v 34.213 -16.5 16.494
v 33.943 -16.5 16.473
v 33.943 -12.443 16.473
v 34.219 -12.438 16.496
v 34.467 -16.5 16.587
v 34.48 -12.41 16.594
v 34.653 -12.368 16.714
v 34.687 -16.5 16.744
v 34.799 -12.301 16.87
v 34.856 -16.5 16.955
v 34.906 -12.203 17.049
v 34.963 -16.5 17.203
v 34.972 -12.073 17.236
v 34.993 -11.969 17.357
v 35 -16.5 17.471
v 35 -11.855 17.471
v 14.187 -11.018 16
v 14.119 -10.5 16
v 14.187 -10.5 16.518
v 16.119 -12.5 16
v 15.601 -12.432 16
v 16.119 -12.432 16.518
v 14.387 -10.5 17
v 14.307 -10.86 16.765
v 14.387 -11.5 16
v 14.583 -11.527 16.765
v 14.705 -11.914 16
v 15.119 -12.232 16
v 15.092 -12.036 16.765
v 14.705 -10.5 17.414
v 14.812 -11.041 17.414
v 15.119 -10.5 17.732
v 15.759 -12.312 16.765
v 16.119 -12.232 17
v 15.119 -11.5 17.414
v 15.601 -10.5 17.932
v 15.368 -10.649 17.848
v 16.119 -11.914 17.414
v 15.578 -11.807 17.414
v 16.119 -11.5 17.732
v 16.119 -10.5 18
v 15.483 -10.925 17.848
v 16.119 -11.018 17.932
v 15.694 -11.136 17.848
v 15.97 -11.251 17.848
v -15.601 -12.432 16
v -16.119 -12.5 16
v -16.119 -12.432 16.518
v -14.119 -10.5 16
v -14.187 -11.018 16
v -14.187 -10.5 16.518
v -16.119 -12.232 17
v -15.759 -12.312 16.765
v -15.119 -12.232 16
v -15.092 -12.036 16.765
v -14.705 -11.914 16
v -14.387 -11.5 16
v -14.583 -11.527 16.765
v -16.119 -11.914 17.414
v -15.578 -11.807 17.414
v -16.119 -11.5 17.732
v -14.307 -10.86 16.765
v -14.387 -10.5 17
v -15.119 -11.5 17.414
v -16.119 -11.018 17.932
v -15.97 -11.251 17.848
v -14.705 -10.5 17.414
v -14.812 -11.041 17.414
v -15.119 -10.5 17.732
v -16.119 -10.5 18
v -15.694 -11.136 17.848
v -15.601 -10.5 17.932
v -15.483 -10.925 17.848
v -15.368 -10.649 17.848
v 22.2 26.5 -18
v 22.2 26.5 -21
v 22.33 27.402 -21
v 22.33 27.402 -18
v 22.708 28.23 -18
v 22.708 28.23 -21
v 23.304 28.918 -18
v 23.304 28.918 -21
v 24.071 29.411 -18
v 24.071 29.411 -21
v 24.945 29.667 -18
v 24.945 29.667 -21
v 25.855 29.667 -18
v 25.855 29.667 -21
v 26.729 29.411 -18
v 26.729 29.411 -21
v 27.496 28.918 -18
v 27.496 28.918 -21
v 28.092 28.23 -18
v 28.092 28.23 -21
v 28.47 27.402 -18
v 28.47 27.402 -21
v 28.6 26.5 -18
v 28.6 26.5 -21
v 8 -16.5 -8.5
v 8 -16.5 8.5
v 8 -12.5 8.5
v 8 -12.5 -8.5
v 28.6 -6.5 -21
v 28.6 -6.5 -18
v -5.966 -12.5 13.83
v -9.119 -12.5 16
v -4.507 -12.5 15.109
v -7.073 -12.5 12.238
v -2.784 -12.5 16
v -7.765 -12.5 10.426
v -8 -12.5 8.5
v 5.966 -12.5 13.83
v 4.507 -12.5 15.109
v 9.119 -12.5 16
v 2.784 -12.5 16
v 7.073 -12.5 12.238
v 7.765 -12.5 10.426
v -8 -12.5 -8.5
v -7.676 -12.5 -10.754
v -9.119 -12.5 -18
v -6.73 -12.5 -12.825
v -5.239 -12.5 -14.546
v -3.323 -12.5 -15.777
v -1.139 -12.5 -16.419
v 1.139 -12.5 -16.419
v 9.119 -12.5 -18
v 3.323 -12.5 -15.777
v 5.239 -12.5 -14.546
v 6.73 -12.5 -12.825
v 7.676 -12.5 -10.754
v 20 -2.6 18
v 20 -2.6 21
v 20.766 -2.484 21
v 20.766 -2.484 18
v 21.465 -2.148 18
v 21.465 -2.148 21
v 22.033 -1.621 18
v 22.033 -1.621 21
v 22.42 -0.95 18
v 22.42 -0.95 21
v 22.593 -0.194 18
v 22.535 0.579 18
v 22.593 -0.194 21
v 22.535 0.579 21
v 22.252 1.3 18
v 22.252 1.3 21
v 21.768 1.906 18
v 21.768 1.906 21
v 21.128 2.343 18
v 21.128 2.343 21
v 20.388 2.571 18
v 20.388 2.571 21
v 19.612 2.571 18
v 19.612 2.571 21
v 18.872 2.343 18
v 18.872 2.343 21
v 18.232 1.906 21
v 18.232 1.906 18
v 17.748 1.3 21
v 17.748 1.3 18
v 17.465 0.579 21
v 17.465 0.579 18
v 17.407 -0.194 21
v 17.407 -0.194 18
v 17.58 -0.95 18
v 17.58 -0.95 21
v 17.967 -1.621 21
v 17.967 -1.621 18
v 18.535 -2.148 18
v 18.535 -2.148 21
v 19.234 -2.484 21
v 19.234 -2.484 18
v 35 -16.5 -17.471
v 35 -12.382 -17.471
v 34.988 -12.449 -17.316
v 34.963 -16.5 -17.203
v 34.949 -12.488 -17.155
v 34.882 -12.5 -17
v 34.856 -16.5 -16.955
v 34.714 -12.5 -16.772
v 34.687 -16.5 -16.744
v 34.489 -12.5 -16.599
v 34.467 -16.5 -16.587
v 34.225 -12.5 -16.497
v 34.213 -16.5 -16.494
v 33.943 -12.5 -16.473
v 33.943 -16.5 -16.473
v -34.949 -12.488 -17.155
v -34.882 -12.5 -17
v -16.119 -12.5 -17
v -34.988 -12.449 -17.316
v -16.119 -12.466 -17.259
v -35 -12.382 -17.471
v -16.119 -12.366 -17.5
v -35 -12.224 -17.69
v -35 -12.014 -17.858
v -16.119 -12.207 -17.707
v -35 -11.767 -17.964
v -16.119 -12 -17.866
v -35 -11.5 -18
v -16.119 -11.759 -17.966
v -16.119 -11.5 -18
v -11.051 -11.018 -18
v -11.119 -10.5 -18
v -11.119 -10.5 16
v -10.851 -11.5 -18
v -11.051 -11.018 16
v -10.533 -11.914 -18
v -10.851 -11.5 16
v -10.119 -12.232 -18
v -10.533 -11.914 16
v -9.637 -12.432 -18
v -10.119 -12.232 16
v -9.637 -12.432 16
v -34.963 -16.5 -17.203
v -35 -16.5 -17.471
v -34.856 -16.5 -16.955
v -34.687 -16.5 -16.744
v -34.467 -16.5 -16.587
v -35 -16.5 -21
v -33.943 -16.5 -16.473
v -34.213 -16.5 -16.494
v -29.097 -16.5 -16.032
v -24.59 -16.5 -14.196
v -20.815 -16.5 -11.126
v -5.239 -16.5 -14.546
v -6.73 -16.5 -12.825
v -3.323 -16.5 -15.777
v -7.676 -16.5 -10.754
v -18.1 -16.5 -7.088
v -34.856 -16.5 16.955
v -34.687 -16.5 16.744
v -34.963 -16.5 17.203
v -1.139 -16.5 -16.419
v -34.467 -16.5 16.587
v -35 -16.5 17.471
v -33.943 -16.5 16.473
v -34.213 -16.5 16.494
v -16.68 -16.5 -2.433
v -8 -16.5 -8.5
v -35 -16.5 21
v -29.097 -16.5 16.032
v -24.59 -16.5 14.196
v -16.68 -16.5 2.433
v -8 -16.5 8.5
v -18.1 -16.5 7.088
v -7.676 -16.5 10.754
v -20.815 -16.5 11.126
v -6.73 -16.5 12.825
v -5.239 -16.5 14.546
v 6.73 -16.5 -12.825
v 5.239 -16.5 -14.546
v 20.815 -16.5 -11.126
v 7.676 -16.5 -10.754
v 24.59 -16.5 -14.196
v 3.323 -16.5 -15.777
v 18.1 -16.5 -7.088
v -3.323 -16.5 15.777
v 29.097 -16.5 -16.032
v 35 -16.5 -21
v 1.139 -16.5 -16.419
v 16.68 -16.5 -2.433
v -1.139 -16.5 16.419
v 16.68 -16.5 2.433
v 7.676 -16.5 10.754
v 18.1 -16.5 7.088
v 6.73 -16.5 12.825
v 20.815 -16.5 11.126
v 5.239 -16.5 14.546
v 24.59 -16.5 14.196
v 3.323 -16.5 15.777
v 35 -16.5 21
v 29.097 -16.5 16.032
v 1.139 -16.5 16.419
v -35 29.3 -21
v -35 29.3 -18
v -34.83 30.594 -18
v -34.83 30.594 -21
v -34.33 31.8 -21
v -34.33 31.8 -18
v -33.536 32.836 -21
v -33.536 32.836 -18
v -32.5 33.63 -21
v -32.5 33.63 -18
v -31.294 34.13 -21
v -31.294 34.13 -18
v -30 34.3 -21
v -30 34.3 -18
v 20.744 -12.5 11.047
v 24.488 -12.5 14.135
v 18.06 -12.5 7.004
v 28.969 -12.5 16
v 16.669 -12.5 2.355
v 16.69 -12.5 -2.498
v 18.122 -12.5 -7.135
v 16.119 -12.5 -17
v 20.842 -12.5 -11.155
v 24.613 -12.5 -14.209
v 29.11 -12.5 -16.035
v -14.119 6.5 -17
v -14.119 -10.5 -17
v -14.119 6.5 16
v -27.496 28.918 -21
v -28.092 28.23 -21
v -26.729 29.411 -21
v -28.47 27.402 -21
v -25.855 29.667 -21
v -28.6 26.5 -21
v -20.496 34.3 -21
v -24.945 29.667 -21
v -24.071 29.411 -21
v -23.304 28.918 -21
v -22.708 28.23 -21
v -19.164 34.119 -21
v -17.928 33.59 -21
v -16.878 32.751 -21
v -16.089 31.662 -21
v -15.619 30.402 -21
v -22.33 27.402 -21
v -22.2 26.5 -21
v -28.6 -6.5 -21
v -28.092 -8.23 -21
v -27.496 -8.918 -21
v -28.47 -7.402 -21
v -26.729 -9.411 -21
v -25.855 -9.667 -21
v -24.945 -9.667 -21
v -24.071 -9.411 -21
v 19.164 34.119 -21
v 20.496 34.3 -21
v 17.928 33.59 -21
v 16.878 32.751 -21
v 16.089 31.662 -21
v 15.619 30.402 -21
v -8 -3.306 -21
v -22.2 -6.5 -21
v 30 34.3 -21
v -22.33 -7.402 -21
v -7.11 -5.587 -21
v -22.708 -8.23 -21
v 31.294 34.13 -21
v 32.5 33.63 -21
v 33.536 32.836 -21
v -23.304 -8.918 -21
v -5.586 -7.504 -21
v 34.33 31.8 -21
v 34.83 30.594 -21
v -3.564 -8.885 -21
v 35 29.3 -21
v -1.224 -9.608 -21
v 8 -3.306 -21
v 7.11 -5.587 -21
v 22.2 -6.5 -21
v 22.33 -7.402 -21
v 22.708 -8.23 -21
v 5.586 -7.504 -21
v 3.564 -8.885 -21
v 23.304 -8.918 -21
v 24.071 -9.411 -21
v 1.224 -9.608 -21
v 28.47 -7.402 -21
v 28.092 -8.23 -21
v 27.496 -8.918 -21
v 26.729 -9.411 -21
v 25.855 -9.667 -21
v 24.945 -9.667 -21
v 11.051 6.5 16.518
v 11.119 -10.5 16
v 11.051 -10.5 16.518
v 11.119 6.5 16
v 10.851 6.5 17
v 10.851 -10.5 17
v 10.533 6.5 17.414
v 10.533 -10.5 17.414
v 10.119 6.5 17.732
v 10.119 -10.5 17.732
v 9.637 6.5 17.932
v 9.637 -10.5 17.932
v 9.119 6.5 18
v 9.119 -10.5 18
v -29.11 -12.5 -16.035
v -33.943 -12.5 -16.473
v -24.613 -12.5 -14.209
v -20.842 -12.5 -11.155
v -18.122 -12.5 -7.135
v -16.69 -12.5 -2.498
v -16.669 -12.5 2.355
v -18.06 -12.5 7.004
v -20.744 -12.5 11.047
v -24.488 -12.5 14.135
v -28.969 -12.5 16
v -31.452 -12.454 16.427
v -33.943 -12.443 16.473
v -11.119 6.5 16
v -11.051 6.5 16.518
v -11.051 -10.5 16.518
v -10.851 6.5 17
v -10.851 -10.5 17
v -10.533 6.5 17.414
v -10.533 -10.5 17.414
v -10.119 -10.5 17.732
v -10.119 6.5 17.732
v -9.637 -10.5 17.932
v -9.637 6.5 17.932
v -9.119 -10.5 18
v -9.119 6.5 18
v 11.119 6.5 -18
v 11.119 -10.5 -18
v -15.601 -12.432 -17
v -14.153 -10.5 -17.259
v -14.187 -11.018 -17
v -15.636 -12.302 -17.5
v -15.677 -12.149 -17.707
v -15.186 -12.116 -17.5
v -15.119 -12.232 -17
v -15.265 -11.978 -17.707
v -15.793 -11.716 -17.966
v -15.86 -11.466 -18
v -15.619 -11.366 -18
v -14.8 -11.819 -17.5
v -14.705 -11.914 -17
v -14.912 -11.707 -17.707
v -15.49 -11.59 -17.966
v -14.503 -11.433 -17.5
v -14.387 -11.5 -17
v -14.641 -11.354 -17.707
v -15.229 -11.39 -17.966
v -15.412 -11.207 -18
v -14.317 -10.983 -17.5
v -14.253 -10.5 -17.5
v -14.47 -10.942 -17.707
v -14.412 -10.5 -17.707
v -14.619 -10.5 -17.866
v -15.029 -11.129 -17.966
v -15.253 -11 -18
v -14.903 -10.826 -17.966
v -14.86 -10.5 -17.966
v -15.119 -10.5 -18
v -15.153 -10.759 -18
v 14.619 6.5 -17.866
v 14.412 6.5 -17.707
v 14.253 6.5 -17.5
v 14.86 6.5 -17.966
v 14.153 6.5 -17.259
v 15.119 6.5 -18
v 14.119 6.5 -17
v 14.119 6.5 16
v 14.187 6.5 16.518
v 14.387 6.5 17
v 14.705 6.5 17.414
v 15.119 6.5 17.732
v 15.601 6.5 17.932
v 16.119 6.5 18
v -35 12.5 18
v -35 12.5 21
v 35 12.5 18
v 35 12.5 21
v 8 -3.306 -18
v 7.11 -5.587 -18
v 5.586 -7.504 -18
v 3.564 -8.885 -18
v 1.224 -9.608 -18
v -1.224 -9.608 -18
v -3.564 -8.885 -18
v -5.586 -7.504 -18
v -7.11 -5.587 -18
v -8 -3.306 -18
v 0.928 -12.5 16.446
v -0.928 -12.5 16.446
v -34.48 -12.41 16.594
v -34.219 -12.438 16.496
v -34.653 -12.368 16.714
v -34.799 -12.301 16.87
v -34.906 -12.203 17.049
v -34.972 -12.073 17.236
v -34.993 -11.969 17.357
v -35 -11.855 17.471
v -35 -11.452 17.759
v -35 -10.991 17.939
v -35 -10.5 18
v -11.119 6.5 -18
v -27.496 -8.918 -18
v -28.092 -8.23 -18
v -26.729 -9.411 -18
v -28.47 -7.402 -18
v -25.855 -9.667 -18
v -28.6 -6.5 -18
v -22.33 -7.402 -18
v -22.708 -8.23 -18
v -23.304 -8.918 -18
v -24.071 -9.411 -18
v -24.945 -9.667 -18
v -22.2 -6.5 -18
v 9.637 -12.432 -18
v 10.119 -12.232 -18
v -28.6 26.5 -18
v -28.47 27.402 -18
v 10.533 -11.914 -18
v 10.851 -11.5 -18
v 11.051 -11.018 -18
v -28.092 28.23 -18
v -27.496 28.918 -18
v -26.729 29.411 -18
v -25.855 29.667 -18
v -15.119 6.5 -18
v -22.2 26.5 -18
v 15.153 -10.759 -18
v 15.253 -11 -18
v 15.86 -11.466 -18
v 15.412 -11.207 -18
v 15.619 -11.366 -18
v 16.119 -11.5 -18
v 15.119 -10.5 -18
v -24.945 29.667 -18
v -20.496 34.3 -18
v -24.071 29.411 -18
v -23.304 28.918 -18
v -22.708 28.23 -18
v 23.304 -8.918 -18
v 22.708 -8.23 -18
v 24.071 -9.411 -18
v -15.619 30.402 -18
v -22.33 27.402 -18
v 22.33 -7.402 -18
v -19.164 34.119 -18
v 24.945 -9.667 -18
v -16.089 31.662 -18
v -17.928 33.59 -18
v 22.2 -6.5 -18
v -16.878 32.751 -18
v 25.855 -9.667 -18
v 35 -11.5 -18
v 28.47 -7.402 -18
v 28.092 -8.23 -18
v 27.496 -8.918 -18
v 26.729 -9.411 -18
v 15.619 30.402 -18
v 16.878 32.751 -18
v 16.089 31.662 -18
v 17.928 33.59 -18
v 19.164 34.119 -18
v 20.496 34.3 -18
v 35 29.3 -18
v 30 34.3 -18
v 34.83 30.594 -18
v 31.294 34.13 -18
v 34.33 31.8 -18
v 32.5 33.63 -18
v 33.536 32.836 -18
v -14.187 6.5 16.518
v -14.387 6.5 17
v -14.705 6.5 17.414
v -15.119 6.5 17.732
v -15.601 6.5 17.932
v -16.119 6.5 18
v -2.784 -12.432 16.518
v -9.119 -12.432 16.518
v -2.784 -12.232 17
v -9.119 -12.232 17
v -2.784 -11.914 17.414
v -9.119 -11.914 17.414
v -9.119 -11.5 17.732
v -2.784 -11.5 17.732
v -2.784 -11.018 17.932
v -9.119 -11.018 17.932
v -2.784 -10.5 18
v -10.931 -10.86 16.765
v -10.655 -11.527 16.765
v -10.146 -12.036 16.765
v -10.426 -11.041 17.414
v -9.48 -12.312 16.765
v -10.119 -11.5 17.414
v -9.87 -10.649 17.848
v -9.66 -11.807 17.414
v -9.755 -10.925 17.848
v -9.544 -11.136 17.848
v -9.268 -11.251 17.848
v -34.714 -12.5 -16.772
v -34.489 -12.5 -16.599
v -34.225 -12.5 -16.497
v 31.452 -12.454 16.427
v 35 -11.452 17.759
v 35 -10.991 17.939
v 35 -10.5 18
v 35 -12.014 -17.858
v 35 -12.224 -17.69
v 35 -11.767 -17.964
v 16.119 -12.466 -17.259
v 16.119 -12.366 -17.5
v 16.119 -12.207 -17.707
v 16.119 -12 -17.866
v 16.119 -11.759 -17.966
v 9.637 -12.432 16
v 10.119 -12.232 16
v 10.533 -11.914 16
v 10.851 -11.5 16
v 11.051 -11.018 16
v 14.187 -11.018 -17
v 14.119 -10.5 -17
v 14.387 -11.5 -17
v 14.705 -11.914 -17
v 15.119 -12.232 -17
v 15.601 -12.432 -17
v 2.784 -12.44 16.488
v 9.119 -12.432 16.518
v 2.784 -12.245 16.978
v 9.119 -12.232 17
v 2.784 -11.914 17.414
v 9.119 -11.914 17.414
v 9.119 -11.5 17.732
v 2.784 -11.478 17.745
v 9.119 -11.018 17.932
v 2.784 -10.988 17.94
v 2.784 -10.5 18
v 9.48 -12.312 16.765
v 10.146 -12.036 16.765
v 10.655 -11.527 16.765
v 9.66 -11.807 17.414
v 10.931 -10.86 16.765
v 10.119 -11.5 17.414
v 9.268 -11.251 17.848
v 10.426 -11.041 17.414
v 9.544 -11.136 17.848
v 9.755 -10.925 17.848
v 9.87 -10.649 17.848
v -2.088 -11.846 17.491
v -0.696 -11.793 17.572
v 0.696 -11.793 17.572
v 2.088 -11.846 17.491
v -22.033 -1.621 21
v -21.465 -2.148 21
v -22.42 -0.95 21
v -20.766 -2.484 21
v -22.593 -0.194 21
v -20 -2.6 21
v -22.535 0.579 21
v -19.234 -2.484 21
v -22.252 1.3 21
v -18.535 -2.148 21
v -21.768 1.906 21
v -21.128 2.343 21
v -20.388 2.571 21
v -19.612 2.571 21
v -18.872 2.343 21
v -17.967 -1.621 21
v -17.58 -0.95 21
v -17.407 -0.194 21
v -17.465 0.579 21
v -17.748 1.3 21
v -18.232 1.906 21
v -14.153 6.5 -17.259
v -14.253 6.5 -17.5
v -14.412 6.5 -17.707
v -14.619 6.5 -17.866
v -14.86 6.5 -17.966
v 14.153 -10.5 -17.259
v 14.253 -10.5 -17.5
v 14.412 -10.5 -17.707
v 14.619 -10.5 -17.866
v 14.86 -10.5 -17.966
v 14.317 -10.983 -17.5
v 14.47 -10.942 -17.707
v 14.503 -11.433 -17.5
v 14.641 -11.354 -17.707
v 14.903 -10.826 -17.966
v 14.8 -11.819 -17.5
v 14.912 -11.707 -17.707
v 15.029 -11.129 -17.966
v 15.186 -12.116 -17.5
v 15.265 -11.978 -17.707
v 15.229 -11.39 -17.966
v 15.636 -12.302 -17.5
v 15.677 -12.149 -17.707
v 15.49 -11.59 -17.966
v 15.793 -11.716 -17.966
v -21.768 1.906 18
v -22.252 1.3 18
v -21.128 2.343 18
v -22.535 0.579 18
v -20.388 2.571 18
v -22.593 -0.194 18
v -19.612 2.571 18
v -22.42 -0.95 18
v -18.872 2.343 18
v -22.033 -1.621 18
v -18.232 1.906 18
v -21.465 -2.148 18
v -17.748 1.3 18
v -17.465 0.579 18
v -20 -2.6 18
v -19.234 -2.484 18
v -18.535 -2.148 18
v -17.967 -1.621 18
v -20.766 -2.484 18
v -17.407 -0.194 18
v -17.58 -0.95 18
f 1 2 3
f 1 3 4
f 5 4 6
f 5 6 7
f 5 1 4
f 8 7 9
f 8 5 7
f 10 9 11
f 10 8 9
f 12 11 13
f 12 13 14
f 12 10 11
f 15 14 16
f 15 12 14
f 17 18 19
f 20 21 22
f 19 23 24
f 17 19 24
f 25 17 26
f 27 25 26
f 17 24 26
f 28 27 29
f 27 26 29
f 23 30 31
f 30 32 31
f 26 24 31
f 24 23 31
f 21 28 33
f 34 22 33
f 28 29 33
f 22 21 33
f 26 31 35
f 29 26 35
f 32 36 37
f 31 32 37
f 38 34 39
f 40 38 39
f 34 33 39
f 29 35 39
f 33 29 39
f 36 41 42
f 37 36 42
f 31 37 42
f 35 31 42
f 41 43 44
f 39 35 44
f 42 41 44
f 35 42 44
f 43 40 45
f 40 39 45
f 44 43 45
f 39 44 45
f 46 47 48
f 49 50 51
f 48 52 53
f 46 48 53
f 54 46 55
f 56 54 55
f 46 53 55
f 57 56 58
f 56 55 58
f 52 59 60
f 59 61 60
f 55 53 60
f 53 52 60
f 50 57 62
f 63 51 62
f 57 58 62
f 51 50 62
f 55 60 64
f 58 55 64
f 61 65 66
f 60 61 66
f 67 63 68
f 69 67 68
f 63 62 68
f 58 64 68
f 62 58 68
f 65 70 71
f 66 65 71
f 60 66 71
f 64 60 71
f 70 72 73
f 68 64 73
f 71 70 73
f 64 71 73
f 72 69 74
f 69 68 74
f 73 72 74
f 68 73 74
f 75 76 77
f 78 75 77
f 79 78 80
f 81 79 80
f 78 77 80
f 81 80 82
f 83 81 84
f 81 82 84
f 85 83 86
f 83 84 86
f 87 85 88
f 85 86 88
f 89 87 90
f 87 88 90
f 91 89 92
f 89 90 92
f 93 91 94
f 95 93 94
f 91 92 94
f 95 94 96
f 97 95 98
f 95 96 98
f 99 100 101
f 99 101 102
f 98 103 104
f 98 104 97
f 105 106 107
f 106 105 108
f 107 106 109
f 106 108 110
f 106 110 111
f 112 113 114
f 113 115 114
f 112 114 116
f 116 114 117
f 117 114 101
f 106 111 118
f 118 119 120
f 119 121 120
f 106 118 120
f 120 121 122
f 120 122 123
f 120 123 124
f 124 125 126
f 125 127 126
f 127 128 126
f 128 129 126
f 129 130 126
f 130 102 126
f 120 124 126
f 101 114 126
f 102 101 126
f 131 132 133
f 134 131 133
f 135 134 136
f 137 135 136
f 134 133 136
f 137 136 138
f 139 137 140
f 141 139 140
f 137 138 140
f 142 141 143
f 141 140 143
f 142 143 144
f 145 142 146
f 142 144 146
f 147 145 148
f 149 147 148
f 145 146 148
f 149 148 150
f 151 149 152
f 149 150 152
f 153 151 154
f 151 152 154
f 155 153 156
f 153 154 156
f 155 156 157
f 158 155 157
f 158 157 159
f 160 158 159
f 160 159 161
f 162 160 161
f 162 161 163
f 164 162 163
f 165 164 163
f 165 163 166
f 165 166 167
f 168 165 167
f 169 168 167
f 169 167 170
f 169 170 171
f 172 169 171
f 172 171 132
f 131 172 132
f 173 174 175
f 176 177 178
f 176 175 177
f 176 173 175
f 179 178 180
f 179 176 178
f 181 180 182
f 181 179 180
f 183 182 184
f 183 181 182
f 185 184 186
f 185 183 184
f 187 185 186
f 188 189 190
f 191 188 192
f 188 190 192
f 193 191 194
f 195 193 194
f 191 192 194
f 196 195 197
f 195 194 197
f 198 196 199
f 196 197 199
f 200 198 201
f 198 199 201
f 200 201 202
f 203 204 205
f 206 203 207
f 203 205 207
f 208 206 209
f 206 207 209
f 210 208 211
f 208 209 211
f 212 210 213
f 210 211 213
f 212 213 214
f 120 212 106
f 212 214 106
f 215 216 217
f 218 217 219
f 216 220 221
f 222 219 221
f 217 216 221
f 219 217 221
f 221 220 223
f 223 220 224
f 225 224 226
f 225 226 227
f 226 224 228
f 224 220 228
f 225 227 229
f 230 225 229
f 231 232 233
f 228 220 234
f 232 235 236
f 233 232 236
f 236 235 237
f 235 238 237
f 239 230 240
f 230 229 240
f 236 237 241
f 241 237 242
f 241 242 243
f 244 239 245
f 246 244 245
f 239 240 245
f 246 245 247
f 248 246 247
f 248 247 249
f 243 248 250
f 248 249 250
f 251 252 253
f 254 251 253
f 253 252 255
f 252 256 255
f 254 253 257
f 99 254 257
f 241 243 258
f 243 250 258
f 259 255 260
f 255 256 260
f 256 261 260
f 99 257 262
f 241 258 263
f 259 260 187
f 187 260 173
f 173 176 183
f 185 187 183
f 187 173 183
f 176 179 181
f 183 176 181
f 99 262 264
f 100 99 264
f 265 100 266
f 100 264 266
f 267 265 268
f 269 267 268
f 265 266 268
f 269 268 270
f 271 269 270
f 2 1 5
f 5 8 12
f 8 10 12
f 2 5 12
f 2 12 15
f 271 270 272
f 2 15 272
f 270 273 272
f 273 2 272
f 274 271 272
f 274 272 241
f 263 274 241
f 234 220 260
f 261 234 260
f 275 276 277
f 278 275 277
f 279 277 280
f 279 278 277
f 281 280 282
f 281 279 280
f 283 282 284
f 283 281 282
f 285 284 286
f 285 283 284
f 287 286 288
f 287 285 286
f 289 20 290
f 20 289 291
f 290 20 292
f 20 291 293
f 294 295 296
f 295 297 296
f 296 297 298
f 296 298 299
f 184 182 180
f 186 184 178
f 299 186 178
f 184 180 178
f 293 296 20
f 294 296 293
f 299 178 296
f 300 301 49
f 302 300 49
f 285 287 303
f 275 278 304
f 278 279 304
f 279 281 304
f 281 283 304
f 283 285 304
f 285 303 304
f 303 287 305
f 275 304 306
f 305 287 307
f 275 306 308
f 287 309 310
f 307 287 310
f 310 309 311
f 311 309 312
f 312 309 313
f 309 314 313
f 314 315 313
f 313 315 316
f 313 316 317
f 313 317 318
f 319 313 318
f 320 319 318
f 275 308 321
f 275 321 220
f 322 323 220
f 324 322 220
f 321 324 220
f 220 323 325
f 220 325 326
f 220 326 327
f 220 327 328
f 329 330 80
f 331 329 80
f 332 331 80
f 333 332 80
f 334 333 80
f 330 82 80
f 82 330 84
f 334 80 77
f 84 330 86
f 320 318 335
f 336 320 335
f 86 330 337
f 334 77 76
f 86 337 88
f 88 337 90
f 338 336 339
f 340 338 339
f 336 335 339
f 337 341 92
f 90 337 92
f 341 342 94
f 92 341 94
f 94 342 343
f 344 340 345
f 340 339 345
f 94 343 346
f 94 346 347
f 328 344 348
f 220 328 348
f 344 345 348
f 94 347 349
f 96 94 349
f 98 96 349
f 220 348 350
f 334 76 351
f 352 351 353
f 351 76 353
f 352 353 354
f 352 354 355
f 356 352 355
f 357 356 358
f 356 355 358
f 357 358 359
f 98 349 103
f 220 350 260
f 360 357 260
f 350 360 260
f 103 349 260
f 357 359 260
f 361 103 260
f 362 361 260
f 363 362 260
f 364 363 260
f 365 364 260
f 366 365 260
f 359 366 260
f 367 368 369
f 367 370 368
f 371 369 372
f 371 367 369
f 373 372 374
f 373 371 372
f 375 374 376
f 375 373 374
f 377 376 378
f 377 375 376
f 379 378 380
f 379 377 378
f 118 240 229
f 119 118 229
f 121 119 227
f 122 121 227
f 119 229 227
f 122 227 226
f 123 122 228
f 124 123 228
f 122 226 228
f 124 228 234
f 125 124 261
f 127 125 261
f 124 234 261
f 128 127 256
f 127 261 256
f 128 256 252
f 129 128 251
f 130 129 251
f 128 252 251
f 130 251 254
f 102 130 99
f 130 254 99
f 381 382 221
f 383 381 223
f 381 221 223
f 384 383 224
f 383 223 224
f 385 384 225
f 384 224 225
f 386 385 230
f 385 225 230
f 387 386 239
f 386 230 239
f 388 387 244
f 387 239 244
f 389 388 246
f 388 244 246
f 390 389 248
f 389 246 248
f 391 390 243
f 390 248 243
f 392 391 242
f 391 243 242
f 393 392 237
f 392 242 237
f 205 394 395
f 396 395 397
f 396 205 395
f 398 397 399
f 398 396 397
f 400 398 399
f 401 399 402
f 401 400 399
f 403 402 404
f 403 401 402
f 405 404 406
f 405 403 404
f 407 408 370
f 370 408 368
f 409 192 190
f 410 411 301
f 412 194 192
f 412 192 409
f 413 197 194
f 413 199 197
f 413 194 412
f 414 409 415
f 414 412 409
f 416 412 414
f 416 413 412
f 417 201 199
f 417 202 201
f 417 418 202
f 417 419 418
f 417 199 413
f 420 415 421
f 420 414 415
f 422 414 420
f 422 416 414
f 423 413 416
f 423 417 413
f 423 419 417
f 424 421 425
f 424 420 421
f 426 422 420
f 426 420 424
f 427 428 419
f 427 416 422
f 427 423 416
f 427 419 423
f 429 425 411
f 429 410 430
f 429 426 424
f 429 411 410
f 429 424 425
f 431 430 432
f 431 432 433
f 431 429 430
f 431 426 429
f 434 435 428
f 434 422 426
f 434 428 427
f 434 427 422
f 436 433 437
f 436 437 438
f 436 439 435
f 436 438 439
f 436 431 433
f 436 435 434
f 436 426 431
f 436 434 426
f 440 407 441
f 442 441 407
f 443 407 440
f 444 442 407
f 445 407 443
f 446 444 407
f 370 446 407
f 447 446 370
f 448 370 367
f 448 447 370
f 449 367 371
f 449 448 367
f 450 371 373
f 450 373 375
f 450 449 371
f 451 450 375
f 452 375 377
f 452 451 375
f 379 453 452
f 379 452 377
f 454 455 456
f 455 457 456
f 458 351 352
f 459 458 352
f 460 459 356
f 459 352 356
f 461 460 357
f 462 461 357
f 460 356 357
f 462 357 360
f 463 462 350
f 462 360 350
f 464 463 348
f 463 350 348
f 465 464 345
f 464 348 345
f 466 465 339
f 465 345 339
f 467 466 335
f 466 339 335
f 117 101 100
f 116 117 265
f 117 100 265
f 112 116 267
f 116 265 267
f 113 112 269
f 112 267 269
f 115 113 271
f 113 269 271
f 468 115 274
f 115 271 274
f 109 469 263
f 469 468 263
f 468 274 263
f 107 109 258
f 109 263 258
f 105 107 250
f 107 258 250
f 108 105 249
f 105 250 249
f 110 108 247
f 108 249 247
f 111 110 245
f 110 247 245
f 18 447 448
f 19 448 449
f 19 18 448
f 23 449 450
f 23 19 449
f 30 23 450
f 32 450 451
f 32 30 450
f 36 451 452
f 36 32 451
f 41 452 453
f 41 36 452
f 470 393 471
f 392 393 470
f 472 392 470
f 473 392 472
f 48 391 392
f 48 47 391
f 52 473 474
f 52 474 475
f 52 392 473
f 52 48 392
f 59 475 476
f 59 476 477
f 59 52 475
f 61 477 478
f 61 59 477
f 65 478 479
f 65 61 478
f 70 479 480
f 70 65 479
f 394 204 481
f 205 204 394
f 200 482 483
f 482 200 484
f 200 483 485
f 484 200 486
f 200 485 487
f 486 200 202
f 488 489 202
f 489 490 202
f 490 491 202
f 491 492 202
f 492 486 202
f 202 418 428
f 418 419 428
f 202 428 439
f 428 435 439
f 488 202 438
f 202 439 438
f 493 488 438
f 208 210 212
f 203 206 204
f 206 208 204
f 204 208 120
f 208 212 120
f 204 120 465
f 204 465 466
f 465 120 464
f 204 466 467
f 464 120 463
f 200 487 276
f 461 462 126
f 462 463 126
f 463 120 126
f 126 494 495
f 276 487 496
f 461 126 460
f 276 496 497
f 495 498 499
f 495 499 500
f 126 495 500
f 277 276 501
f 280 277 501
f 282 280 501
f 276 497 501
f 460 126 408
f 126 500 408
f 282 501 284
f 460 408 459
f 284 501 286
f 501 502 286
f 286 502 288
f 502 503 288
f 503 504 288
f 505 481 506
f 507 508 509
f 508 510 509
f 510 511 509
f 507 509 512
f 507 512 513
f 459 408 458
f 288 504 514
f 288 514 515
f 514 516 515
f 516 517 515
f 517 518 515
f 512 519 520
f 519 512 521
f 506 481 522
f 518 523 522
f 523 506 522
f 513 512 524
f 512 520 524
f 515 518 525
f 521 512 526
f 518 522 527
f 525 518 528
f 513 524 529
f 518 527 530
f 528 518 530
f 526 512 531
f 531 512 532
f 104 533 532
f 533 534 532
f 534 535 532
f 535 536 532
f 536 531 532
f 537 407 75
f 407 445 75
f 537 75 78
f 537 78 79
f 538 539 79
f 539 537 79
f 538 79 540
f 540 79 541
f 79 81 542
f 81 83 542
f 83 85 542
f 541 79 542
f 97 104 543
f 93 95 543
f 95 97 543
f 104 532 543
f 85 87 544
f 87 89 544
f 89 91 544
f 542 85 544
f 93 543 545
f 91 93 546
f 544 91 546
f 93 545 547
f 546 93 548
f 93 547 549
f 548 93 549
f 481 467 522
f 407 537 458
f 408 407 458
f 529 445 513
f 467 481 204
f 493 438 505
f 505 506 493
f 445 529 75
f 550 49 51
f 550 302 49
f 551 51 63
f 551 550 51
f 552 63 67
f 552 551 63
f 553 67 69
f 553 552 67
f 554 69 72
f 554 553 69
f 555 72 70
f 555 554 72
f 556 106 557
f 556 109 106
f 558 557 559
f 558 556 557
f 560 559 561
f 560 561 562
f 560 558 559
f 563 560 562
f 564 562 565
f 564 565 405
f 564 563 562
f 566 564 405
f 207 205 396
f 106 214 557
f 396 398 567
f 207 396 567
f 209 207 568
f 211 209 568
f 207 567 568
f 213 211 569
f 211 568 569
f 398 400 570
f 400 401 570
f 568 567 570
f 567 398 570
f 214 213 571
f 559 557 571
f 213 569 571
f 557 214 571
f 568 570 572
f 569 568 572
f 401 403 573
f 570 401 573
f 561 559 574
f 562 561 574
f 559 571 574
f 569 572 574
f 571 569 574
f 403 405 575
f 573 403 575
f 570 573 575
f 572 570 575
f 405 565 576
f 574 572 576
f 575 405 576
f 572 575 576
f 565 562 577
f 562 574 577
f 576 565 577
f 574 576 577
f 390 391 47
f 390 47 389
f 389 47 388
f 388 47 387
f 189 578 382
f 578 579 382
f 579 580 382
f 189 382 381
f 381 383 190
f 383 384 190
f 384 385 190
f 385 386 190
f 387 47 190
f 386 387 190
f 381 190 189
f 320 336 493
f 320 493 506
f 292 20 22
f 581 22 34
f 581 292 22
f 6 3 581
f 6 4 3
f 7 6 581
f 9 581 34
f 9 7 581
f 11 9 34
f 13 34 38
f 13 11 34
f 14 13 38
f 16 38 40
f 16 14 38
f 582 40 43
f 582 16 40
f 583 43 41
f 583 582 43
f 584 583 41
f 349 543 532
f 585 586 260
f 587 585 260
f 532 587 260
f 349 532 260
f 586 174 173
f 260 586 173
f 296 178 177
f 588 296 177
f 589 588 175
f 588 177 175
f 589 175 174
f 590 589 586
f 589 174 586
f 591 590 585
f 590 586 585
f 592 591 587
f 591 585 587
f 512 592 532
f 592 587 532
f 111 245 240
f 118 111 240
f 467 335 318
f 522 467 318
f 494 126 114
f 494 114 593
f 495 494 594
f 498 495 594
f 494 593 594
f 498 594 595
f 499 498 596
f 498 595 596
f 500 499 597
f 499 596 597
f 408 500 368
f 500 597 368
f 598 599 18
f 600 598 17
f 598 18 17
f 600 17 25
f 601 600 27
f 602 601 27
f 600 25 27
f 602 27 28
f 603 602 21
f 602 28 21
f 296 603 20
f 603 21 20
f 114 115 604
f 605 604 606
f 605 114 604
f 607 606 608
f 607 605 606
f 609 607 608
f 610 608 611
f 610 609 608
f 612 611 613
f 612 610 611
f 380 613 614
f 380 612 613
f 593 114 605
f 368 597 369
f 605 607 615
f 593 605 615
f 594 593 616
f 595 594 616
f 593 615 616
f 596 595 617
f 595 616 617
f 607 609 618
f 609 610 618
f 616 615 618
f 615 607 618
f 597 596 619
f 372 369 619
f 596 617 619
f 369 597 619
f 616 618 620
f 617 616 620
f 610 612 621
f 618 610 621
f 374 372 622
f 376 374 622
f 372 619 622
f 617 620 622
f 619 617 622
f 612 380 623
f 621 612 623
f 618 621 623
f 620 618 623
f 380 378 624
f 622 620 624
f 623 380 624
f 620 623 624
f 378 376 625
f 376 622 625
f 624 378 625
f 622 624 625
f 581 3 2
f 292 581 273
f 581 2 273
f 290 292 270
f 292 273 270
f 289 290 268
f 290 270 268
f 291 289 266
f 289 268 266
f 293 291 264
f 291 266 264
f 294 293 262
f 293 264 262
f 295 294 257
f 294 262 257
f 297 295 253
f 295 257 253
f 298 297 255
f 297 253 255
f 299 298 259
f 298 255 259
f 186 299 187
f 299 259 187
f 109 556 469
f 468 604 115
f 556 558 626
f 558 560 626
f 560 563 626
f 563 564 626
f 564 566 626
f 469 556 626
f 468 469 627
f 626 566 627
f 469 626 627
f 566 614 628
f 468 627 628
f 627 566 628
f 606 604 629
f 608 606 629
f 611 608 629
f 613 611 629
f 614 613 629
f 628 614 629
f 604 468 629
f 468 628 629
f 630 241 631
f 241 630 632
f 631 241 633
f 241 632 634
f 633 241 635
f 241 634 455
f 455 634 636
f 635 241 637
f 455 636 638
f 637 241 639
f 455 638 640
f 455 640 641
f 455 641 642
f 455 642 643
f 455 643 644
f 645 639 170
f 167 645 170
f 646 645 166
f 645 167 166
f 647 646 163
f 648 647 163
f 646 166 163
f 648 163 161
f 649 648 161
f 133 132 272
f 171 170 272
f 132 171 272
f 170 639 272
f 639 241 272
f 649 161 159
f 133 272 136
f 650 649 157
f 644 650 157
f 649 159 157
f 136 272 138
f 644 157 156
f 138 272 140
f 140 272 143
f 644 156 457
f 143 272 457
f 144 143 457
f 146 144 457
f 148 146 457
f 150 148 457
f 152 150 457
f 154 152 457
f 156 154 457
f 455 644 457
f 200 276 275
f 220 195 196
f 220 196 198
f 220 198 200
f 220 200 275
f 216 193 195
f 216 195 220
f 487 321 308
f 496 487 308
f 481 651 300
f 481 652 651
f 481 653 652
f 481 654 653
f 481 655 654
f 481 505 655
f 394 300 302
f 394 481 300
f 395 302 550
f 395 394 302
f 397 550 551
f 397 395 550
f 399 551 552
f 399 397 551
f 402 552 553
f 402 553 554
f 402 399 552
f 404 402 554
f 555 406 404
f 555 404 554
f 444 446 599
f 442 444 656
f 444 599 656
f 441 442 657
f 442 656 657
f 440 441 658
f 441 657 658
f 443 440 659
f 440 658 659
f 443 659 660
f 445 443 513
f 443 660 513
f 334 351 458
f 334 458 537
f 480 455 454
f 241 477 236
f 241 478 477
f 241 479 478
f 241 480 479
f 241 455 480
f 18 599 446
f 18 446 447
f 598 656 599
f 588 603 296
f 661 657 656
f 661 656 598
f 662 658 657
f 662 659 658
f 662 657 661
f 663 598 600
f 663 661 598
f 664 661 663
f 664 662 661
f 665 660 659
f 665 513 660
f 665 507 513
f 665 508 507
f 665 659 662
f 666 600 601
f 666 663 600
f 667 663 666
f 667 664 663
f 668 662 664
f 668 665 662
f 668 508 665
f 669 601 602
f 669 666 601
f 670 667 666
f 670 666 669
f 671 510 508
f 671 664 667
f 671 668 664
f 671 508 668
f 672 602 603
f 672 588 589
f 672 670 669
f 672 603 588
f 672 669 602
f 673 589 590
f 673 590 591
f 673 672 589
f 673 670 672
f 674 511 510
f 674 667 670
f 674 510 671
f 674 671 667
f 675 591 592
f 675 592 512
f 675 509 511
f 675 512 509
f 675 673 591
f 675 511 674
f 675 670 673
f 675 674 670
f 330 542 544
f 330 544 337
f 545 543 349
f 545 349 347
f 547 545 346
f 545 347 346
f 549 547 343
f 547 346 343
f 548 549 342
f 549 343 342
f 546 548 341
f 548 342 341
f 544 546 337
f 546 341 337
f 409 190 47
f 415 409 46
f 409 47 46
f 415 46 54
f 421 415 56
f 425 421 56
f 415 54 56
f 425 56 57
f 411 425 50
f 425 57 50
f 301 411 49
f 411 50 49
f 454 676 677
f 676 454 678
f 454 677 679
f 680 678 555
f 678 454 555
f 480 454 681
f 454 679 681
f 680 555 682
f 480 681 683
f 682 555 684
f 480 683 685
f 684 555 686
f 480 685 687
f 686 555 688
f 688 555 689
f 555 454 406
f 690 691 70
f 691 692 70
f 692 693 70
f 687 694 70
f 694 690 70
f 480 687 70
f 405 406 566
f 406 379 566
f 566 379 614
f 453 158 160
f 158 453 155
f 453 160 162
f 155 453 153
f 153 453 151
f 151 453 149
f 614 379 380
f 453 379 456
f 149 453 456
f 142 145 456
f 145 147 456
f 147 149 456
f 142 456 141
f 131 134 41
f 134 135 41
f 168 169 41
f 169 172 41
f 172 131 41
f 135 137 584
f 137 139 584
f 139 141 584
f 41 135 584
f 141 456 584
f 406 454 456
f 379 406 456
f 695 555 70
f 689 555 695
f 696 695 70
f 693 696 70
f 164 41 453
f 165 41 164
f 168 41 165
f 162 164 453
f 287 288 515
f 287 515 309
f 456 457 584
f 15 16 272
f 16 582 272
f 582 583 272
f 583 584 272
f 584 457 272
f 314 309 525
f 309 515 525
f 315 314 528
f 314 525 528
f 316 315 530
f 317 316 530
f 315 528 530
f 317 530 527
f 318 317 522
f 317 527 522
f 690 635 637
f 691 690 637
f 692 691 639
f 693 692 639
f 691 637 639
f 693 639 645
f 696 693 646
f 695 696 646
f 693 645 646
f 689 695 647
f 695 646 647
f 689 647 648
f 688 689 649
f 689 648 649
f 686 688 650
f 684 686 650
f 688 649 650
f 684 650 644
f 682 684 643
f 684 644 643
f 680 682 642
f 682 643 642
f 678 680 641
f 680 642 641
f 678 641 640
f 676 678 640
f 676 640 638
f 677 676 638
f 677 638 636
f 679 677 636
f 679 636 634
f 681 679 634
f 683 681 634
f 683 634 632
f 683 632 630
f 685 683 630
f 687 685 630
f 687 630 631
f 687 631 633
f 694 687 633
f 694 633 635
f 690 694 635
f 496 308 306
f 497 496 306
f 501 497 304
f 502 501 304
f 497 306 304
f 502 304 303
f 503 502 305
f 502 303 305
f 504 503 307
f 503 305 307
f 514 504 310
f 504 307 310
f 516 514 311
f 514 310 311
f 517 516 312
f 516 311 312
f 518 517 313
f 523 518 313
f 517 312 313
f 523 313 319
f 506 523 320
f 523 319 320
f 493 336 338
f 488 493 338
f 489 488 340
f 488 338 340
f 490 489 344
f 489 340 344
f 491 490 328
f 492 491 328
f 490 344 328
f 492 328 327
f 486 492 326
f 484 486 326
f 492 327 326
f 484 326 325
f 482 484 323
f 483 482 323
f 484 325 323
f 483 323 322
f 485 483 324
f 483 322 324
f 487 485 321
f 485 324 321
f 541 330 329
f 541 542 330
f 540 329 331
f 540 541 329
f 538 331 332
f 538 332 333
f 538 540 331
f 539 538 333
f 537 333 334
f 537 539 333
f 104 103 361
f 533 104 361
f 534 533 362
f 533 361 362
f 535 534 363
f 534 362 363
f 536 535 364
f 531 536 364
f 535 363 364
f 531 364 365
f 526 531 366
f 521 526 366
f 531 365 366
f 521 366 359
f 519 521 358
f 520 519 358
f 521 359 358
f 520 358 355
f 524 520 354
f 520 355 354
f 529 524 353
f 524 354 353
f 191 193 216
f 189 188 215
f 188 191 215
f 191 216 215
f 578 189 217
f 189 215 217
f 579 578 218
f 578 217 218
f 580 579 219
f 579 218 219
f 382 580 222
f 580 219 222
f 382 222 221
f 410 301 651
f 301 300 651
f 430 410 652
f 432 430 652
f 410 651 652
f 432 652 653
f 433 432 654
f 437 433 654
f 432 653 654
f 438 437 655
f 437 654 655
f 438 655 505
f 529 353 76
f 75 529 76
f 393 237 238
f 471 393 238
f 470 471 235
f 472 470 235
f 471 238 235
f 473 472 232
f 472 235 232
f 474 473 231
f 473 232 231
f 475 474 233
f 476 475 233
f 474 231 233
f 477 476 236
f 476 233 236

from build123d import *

# Parameters (mm, degrees)
PAD_DEPTH       = 35
SKETCH001_R     = 16.5
POCKET_DEPTH    = 5
POCKET001_DEPTH = 5
FILLET_R        = 1
FILLET001_R     = 5
SKETCH003_R     = 2.6
POCKET002_DEPTH = 5
SKETCH004_W     = 36
SKETCH004_H     = 3
PAD001_DEPTH    = 19
FILLET002_R     = 2
FILLET003_R     = 2
FILLET004_R     = 1


with BuildPart() as part:
    # Sketch → Pad (new body, symmetric)
    with BuildSketch(Plane.YZ):
        Polygon((34.3, -18), (34.3, -21), (-16.5, -21), (-16.5, 21), (12.5, 21), (12.5, 18), (-12.5, 18), (-12.5, -18), align=None)
    extrude(amount=PAD_DEPTH, both=True)

    # Sketch001 (on Face3 of Pad) → Pocket (cut)
    with BuildSketch(Plane(origin=(0, -16.5, 0), x_dir=(0, 0, -1), z_dir=(0, -1, 0))):
        with Locations((0, 33)):
            Circle(SKETCH001_R)
        with Locations((0, -33)):
            Circle(SKETCH001_R)
        with BuildLine():
            ThreePointArc((-8.5, 8), (-16.5, 0), (-8.5, -8))
            Line((-8.5, -8), (8.5, -8))
            ThreePointArc((8.5, -8), (16.5, 0), (8.5, 8))
            Line((-8.5, 8), (8.5, 8))
        make_face()
    extrude(amount=-POCKET_DEPTH, mode=Mode.SUBTRACT)

    # Sketch002 (on Face3 of Pocket) → Pocket001 (cut)
    with BuildSketch(Plane.YX.offset(21)):
        with BuildLine():
            ThreePointArc((-6.5, -22.2), (-9.7, -25.4), (-6.5, -28.6))
            Line((-6.5, -28.6), (26.5, -28.6))
            ThreePointArc((26.5, -28.6), (29.7, -25.4), (26.5, -22.2))
            Line((-6.5, -22.2), (26.5, -22.2))
        make_face()
        with BuildLine():
            ThreePointArc((-6.5, 28.6), (-9.7, 25.4), (-6.5, 22.2))
            Line((-6.5, 22.2), (26.5, 22.2))
            ThreePointArc((26.5, 22.2), (29.7, 25.4), (26.5, 28.6))
            Line((-6.5, 28.6), (26.5, 28.6))
        make_face()
        with BuildLine():
            ThreePointArc((-3.306398, 8), (-9.7, 0), (-3.306398, -8))
            Line((-3.306398, -8), (34.3, -16.5))
            ThreePointArc((34.3, -16.5), (54.94564, 0), (34.3, 16.5))
            Line((-3.306398, 8), (34.3, 16.5))
        make_face()
    extrude(amount=-POCKET001_DEPTH, mode=Mode.SUBTRACT)

    # Fillet
    fillet_edges = [part.edges().sort_by_distance(p)[0] for p in [
        (35, -14.5, 16.378339),
        (-35, -14.5, 16.378339),
        (-35, -14.5, -16.378339),
        (35, -14.5, -16.378339),
    ]]
    fillet(fillet_edges, radius=FILLET_R)

    # Fillet001
    fillet001_edges = [part.edges().sort_by_distance(p)[0] for p in [
        (35, 34.3, -19.5),
        (16.5, 34.3, -19.5),
        (-16.5, 34.3, -19.5),
        (-35, 34.3, -19.5),
    ]]
    fillet(fillet001_edges, radius=FILLET001_R)

    # Sketch003 (on Face39 of Fillet001) → Pocket002 (cut)
    with BuildSketch(Plane(origin=(0, 0, 21), x_dir=(0, -1, 0), z_dir=(0, 0, 1))):
        with Locations((0, 20)):
            Circle(SKETCH003_R)
        with Locations((0, -20)):
            Circle(SKETCH003_R)
    extrude(amount=-POCKET002_DEPTH, mode=Mode.SUBTRACT)

    # Sketch004 (on Face4 of Pocket002) → Pad001 (join)
    with BuildSketch(Plane.ZX.offset(-12.5)):
        with Locations((0, -12.619025)):
            Rectangle(SKETCH004_W, SKETCH004_H)
        with Locations((0, 12.619025)):
            Rectangle(SKETCH004_W, SKETCH004_H)
    extrude(amount=PAD001_DEPTH)

    # Fillet002
    fillet002_edges = [part.edges().sort_by_distance(p)[0] for p in [
        (14.119025, -12.5, 0),
        (-11.119025, -12.5, 0),
        (11.119025, -12.5, 0),
        (-14.119025, -12.5, 0),
    ]]
    fillet(fillet002_edges, radius=FILLET002_R)

    # Fillet003
    fillet003_edges = [part.edges().sort_by_distance(p)[0] for p in [
        (-25.559513, -12.5, 18),
        (0, -12.5, 18),
        (25.559513, -12.5, 18),
    ]]
    fillet(fillet003_edges, radius=FILLET003_R)

    # Fillet004
    fillet004_edges = [part.edges().sort_by_distance(p)[0] for p in [
        (25.559513, -12.5, -18),
        (-25.559513, -12.5, -18),
    ]]
    fillet(fillet004_edges, radius=FILLET004_R)


solid = part.part
